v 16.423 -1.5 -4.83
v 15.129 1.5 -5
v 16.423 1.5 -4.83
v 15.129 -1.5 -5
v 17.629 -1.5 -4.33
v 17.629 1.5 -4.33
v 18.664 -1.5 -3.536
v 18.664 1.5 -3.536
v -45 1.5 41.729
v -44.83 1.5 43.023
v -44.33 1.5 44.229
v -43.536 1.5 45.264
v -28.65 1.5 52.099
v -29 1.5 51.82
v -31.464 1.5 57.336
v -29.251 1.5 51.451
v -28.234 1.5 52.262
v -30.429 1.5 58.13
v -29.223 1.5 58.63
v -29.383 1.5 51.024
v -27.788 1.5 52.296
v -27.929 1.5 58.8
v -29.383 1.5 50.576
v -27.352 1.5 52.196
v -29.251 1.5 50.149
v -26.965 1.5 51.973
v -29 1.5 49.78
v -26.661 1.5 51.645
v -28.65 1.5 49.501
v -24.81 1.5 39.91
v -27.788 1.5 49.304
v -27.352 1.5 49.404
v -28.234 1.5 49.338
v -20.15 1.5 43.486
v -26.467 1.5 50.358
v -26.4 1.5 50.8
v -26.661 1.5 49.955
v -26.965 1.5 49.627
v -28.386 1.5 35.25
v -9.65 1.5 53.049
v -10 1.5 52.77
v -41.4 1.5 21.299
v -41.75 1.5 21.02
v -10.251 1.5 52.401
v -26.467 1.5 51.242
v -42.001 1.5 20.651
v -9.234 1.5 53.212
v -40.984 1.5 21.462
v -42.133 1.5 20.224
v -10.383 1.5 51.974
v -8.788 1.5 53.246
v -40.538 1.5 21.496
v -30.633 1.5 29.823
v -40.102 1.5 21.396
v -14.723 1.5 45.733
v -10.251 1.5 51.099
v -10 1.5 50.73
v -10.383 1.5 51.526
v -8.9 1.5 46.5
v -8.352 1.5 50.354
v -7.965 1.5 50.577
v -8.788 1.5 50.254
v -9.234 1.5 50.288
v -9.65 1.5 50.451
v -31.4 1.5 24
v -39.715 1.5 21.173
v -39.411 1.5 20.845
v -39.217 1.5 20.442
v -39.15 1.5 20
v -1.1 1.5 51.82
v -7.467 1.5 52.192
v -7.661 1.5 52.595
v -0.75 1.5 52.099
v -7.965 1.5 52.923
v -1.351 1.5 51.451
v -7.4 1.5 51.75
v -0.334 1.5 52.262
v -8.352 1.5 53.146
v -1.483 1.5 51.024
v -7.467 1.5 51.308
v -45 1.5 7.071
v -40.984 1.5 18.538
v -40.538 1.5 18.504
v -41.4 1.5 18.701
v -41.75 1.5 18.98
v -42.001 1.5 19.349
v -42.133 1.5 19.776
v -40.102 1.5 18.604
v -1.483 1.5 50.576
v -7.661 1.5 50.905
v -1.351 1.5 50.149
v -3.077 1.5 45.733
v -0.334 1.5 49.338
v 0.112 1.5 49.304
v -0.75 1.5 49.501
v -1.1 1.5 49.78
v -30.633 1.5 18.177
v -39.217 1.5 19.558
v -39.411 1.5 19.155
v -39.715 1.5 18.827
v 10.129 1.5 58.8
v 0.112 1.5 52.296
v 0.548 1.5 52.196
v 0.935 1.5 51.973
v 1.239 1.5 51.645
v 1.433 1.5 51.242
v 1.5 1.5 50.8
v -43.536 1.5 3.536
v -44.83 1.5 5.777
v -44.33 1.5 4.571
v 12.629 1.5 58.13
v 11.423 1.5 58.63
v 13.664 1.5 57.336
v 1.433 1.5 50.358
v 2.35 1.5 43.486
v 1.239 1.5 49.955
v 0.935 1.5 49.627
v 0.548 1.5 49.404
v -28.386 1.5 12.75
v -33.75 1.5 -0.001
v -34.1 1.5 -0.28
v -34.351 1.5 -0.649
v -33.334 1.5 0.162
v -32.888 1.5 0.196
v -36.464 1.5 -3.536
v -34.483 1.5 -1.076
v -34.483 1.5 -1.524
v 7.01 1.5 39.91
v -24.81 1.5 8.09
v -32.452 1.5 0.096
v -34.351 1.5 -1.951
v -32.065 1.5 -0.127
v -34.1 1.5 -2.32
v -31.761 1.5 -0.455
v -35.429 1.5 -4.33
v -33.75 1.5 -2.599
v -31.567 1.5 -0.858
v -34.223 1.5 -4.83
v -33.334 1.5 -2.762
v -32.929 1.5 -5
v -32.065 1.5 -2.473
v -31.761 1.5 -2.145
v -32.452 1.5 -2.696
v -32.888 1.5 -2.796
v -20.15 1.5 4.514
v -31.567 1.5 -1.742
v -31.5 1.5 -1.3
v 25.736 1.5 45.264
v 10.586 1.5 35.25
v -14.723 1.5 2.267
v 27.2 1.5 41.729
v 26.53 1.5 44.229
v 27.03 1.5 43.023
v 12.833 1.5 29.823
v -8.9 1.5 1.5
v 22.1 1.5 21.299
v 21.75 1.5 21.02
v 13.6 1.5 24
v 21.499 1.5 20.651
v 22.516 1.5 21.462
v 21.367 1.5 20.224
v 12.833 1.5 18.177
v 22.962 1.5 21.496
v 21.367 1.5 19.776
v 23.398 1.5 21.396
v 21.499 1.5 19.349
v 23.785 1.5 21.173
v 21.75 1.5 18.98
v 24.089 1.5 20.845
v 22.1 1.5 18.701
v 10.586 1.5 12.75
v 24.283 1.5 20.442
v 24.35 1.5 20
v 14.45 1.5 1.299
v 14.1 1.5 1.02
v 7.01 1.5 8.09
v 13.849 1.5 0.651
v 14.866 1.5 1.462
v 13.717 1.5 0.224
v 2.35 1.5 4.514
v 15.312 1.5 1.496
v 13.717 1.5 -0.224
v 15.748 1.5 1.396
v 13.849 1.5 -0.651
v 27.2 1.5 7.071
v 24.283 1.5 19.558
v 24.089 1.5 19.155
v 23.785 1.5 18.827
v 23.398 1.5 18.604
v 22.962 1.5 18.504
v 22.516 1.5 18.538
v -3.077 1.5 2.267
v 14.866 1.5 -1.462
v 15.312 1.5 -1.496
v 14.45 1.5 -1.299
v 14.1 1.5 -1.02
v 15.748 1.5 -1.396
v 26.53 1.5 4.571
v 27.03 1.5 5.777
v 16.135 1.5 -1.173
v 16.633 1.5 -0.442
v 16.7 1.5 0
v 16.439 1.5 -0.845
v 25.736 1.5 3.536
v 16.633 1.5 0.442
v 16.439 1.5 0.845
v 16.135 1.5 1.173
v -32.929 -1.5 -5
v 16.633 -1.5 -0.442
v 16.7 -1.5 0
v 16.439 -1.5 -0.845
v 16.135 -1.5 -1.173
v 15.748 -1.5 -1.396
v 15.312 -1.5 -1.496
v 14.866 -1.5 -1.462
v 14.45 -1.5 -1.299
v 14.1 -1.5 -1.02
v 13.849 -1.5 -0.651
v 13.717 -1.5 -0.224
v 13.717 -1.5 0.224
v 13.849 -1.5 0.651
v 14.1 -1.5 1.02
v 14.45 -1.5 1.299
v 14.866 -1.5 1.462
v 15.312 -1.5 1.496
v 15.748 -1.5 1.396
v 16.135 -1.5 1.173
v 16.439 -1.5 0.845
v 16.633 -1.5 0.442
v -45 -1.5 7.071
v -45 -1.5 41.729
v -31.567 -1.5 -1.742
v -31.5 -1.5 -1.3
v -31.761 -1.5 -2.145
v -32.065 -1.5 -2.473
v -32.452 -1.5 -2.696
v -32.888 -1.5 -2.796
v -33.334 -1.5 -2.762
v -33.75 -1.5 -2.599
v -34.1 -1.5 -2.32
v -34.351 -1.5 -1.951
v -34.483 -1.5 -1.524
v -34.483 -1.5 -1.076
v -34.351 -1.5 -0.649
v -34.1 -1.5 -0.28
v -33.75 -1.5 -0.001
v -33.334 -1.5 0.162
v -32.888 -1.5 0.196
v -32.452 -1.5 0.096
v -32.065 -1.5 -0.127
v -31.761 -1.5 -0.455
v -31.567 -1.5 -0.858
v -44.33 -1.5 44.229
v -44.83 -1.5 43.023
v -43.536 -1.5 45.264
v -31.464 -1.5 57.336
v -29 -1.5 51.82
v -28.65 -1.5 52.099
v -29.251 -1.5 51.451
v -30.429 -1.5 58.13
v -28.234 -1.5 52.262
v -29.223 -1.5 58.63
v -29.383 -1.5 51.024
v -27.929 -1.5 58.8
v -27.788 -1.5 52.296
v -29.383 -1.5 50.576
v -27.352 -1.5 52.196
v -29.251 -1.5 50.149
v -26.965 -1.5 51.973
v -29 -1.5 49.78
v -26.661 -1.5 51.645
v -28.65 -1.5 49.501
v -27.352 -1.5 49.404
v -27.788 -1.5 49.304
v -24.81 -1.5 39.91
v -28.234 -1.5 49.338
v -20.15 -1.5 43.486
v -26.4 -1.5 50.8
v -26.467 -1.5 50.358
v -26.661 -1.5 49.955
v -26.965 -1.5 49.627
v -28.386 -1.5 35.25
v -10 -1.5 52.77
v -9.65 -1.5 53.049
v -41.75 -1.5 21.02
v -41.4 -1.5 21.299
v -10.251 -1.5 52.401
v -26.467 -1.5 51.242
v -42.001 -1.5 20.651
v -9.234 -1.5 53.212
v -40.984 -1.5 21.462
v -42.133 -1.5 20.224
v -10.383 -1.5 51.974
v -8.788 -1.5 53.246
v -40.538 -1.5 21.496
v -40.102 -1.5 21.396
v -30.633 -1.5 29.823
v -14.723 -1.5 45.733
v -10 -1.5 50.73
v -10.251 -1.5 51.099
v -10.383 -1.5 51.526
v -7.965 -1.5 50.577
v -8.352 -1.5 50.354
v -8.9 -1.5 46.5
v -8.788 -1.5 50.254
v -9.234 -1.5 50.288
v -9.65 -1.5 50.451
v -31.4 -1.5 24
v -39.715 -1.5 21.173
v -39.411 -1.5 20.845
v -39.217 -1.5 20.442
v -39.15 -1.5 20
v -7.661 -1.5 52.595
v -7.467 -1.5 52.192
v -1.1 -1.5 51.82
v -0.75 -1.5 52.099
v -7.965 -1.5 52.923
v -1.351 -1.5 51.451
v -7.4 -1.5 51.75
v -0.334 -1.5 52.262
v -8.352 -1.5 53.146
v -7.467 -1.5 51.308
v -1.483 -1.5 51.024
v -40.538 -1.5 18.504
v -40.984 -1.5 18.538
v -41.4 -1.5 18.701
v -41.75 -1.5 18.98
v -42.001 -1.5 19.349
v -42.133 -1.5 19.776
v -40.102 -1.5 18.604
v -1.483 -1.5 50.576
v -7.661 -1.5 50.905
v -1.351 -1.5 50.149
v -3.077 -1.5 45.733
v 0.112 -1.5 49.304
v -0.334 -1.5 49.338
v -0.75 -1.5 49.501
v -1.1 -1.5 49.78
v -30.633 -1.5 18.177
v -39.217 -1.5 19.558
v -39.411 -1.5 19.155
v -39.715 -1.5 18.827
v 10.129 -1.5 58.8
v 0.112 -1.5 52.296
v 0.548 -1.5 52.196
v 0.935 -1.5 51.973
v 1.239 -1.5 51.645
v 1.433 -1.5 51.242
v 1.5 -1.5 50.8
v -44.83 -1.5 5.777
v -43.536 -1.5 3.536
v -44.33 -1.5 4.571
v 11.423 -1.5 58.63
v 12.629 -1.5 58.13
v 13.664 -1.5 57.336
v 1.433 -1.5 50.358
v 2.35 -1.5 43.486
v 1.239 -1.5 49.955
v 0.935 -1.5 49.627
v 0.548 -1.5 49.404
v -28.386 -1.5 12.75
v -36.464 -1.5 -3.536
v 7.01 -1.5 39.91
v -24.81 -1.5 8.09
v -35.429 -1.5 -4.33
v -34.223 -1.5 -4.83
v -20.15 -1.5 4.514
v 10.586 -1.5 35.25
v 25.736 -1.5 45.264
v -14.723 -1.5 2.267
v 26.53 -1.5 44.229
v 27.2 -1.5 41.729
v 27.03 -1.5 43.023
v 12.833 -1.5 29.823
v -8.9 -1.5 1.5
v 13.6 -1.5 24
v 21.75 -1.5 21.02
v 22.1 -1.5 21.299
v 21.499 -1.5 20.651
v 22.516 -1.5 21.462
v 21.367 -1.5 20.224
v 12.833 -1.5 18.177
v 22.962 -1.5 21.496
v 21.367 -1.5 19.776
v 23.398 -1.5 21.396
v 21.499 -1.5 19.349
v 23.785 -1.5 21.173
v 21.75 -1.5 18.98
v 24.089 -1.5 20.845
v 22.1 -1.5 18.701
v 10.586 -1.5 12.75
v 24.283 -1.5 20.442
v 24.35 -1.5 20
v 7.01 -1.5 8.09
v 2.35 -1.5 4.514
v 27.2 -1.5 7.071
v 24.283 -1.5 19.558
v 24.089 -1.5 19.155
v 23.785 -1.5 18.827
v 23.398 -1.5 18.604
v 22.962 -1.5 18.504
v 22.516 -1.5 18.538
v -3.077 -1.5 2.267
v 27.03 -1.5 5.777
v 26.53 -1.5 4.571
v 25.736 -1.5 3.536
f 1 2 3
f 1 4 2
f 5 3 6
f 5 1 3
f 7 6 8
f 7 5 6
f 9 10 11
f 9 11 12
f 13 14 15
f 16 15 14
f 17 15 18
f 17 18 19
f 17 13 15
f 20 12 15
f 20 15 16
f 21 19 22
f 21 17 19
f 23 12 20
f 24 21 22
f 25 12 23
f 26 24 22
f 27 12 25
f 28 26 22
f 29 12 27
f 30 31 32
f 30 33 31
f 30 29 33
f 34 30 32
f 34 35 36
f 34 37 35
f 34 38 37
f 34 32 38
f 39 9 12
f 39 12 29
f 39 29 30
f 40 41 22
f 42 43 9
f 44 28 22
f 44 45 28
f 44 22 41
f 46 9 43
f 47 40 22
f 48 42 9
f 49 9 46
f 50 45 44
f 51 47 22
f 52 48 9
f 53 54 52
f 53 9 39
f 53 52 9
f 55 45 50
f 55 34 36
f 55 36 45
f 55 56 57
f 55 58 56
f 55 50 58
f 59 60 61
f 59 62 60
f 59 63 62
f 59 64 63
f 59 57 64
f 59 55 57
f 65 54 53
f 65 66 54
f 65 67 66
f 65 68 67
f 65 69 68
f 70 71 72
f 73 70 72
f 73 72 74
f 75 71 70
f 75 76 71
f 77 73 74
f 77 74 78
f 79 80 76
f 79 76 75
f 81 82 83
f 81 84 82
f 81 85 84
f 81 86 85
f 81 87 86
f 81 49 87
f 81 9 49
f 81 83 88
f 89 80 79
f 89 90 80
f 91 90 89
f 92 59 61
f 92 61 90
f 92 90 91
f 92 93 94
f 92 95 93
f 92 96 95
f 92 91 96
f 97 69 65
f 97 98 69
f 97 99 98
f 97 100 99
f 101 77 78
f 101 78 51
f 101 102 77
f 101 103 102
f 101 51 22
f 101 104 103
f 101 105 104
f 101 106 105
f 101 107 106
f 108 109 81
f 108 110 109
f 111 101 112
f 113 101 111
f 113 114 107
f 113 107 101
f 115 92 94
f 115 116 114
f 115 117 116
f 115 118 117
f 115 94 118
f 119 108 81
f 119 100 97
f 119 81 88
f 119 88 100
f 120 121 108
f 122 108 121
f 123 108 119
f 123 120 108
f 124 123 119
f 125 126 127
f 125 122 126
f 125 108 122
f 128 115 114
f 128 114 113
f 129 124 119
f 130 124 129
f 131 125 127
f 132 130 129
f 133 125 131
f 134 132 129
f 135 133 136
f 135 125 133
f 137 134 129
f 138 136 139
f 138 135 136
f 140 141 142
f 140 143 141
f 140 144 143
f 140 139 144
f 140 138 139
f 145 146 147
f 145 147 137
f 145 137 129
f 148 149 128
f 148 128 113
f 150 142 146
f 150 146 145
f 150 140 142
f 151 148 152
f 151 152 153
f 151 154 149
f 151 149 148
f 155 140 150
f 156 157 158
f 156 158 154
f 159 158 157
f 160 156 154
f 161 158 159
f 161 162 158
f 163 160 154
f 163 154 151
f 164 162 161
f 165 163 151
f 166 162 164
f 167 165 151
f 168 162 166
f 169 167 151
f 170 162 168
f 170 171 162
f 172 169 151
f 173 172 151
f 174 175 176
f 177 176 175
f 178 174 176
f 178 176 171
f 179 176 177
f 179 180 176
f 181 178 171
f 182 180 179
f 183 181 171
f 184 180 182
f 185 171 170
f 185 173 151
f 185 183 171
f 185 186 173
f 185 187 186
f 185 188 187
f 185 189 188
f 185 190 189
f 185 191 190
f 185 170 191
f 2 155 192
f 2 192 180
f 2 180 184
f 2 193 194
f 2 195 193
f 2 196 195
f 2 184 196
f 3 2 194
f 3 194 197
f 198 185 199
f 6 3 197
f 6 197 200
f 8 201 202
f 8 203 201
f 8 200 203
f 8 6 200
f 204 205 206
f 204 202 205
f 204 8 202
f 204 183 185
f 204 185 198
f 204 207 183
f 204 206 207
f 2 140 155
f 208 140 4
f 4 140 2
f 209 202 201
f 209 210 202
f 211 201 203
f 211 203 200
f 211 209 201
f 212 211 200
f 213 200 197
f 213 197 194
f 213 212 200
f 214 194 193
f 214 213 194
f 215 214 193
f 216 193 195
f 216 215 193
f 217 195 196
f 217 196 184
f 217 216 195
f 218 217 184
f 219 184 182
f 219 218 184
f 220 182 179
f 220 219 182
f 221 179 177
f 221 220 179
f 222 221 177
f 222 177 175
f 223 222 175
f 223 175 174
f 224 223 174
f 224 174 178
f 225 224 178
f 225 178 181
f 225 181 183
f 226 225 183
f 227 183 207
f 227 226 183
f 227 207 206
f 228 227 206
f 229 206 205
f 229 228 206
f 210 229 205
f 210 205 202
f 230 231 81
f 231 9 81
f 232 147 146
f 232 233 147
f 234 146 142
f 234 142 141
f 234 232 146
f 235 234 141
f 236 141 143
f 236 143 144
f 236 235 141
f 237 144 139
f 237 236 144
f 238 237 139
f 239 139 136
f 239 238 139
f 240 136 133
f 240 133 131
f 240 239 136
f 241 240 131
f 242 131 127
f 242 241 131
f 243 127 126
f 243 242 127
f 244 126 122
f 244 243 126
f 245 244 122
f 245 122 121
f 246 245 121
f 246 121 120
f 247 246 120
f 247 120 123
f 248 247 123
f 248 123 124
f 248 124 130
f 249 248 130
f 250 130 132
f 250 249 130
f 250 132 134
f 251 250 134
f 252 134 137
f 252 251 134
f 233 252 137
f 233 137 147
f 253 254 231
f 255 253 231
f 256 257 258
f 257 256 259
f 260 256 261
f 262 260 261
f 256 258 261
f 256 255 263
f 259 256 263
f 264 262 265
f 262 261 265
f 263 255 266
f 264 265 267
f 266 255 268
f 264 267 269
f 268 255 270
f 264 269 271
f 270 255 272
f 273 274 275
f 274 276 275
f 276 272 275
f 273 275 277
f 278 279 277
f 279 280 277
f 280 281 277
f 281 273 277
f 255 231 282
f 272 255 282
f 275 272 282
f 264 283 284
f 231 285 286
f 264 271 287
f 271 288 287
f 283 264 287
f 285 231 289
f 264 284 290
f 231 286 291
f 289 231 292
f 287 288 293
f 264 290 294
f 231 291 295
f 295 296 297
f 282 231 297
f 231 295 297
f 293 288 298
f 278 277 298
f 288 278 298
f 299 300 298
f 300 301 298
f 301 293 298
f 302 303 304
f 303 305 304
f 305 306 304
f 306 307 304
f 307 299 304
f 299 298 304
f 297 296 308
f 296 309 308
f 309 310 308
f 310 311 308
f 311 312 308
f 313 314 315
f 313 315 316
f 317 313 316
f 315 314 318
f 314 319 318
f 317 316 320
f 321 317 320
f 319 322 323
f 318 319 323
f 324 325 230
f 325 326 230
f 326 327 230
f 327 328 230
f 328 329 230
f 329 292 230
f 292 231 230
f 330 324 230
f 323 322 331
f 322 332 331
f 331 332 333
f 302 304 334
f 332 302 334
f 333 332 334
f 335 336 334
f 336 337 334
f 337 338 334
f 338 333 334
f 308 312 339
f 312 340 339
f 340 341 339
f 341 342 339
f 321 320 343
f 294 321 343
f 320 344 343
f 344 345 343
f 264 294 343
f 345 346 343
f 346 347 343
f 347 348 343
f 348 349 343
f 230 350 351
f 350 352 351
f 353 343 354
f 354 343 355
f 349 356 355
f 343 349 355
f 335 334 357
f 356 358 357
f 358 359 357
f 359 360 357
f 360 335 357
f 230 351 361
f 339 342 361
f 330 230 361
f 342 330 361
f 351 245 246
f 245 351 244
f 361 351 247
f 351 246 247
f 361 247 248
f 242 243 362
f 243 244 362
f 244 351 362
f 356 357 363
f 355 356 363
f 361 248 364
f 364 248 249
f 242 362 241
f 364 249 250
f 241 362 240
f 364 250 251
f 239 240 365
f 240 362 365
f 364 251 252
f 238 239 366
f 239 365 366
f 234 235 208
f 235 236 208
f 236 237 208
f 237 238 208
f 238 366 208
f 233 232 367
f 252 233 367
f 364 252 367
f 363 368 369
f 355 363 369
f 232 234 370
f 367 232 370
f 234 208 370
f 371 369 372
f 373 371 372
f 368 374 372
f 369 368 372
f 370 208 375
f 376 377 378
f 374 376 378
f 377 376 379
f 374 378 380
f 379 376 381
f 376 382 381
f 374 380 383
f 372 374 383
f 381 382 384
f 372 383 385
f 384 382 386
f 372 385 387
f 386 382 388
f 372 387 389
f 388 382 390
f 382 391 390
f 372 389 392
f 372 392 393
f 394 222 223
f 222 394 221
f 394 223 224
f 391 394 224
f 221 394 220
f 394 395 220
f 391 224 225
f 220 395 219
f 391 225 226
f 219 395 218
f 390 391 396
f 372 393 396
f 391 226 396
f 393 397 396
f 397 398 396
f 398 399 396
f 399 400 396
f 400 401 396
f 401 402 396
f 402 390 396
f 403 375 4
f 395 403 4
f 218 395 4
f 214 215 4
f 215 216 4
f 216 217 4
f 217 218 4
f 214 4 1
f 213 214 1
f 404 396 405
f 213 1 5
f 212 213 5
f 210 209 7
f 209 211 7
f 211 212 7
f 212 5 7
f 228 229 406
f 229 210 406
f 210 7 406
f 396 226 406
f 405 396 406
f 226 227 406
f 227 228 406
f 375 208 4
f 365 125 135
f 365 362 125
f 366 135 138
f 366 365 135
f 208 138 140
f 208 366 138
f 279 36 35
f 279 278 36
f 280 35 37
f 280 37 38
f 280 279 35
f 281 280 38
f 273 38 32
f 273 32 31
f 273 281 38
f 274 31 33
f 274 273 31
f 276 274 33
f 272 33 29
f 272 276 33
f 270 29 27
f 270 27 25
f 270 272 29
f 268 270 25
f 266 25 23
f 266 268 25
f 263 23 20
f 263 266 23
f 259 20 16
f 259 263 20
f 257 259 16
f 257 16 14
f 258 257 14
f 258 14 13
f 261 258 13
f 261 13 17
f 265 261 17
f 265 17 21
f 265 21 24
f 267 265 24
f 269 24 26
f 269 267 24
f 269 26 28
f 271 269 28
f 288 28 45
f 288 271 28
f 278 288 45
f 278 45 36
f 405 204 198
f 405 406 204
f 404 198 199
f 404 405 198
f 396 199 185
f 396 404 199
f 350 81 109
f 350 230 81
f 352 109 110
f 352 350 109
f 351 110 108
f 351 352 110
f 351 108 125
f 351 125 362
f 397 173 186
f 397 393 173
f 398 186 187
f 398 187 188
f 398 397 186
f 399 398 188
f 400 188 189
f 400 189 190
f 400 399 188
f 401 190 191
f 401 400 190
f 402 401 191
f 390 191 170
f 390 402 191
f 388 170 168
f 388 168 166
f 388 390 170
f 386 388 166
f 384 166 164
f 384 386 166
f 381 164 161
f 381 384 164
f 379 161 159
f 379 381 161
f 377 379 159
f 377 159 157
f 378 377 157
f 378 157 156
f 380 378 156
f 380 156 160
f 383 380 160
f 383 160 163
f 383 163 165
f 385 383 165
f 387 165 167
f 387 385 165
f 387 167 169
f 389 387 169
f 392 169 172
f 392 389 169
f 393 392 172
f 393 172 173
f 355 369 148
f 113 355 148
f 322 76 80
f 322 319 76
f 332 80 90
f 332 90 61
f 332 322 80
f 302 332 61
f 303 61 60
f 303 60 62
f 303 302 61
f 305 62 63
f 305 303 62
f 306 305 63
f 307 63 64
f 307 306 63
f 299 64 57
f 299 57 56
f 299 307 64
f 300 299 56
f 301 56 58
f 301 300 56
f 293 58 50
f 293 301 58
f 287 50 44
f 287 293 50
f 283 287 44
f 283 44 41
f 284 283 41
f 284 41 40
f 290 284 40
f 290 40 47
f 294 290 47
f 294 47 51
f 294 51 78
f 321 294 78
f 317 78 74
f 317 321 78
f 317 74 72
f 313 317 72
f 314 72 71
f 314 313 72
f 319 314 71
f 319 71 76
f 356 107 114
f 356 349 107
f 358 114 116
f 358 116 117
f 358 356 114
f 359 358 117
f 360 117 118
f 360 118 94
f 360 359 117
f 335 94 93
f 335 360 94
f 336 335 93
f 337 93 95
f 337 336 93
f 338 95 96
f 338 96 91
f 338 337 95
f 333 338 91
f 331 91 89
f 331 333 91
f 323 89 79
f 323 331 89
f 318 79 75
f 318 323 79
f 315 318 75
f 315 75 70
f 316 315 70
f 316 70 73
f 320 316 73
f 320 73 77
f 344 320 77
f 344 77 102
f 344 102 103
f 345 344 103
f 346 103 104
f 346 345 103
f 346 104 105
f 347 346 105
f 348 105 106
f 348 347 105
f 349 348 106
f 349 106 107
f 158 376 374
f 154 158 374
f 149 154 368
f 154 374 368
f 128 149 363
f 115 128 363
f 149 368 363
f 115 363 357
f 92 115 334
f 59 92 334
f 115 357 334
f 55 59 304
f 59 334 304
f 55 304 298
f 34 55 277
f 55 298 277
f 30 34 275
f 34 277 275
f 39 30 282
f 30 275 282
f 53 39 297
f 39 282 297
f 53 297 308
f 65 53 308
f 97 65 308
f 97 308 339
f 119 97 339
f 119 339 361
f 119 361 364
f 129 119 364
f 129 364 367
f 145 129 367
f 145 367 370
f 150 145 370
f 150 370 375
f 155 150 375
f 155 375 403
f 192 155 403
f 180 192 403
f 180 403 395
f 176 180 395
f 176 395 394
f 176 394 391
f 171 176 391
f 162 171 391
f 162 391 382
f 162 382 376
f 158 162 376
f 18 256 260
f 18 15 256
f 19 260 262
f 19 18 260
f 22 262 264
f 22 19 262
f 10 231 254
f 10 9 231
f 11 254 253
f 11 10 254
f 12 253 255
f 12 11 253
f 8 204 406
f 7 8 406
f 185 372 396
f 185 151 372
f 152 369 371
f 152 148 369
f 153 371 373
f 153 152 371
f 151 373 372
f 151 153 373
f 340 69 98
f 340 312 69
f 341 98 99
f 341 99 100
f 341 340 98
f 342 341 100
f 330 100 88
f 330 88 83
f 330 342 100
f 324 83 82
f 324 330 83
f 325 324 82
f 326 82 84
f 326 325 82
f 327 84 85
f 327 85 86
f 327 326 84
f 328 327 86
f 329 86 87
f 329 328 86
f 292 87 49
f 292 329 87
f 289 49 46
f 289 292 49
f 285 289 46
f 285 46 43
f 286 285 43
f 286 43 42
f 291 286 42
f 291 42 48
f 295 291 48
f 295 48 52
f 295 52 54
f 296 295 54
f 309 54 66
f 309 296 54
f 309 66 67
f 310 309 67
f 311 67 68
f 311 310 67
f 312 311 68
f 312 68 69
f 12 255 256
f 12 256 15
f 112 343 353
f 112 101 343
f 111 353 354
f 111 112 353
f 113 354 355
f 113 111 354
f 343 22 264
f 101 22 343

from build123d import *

# Parameters (mm, degrees)
SKETCH1_W           = 72.2
SKETCH1_H           = 63.8
SKETCH1_R           = 1.5
BOSS_EXTRUDE1_DEPTH = 1.5
CHAMFER1_SIZE       = 15
CHAMFER2_SIZE       = 10
SKETCH2_R           = 22.5
CUT_EXTRUDE1_DEPTH  = 4
FILLET1_R           = 5


with BuildPart() as part:
    # Sketch1 → Boss-Extrude1 (new body, symmetric)
    with BuildSketch(Plane(origin=(0, 0, 0), x_dir=(1, 0, 0), z_dir=(0, 1, 0))):
        with Locations((-8.9, -26.9)):
            Rectangle(SKETCH1_W, SKETCH1_H)
        with Locations((15.2, 0)):
            Circle(SKETCH1_R, mode=Mode.SUBTRACT)
        with Locations((0, -50.8)):
            Circle(SKETCH1_R, mode=Mode.SUBTRACT)
        with Locations((-27.9, -50.8)):
            Circle(SKETCH1_R, mode=Mode.SUBTRACT)
        with Locations((-33, 1.3)):
            Circle(SKETCH1_R, mode=Mode.SUBTRACT)
        with Locations((22.85, -20)):
            Circle(SKETCH1_R, mode=Mode.SUBTRACT)
        with Locations((-40.65, -20)):
            Circle(SKETCH1_R, mode=Mode.SUBTRACT)
        with Locations((-8.9, -51.75)):
            Circle(SKETCH1_R, mode=Mode.SUBTRACT)
    extrude(amount=BOSS_EXTRUDE1_DEPTH, both=True)

    # Chamfer1
    chamfer1_edges = [part.edges().sort_by_distance(p)[0] for p in [
        (27.2, 0, 58.8),
        (-45, 0, 58.8),
    ]]
    chamfer(chamfer1_edges, length=CHAMFER1_SIZE)

    # Chamfer2
    chamfer2_edges = [part.edges().sort_by_distance(p)[0] for p in [
        (-45, 0, -5),
        (27.2, 0, -5),
    ]]
    chamfer(chamfer2_edges, length=CHAMFER2_SIZE)

    # Sketch2 → Cut-Extrude1 (cut, through all)
    with BuildSketch(Plane.XZ.offset(1.5)):
        with Locations((-8.9, 24)):
            Circle(SKETCH2_R)
    extrude(amount=-CUT_EXTRUDE1_DEPTH, mode=Mode.SUBTRACT)

    # Fillet1
    fillet1_edges = [part.edges().sort_by_distance(p)[0] for p in [
        (27.2, 0, 43.8),
        (-30, 0, 58.8),
        (12.2, 0, 58.8),
        (-45, 0, 43.8),
        (-35, 0, -5),
        (17.2, 0, -5),
        (27.2, 0, 5),
        (-45, 0, 5),
    ]]
    fillet(fillet1_edges, radius=FILLET1_R)


solid = part.part
